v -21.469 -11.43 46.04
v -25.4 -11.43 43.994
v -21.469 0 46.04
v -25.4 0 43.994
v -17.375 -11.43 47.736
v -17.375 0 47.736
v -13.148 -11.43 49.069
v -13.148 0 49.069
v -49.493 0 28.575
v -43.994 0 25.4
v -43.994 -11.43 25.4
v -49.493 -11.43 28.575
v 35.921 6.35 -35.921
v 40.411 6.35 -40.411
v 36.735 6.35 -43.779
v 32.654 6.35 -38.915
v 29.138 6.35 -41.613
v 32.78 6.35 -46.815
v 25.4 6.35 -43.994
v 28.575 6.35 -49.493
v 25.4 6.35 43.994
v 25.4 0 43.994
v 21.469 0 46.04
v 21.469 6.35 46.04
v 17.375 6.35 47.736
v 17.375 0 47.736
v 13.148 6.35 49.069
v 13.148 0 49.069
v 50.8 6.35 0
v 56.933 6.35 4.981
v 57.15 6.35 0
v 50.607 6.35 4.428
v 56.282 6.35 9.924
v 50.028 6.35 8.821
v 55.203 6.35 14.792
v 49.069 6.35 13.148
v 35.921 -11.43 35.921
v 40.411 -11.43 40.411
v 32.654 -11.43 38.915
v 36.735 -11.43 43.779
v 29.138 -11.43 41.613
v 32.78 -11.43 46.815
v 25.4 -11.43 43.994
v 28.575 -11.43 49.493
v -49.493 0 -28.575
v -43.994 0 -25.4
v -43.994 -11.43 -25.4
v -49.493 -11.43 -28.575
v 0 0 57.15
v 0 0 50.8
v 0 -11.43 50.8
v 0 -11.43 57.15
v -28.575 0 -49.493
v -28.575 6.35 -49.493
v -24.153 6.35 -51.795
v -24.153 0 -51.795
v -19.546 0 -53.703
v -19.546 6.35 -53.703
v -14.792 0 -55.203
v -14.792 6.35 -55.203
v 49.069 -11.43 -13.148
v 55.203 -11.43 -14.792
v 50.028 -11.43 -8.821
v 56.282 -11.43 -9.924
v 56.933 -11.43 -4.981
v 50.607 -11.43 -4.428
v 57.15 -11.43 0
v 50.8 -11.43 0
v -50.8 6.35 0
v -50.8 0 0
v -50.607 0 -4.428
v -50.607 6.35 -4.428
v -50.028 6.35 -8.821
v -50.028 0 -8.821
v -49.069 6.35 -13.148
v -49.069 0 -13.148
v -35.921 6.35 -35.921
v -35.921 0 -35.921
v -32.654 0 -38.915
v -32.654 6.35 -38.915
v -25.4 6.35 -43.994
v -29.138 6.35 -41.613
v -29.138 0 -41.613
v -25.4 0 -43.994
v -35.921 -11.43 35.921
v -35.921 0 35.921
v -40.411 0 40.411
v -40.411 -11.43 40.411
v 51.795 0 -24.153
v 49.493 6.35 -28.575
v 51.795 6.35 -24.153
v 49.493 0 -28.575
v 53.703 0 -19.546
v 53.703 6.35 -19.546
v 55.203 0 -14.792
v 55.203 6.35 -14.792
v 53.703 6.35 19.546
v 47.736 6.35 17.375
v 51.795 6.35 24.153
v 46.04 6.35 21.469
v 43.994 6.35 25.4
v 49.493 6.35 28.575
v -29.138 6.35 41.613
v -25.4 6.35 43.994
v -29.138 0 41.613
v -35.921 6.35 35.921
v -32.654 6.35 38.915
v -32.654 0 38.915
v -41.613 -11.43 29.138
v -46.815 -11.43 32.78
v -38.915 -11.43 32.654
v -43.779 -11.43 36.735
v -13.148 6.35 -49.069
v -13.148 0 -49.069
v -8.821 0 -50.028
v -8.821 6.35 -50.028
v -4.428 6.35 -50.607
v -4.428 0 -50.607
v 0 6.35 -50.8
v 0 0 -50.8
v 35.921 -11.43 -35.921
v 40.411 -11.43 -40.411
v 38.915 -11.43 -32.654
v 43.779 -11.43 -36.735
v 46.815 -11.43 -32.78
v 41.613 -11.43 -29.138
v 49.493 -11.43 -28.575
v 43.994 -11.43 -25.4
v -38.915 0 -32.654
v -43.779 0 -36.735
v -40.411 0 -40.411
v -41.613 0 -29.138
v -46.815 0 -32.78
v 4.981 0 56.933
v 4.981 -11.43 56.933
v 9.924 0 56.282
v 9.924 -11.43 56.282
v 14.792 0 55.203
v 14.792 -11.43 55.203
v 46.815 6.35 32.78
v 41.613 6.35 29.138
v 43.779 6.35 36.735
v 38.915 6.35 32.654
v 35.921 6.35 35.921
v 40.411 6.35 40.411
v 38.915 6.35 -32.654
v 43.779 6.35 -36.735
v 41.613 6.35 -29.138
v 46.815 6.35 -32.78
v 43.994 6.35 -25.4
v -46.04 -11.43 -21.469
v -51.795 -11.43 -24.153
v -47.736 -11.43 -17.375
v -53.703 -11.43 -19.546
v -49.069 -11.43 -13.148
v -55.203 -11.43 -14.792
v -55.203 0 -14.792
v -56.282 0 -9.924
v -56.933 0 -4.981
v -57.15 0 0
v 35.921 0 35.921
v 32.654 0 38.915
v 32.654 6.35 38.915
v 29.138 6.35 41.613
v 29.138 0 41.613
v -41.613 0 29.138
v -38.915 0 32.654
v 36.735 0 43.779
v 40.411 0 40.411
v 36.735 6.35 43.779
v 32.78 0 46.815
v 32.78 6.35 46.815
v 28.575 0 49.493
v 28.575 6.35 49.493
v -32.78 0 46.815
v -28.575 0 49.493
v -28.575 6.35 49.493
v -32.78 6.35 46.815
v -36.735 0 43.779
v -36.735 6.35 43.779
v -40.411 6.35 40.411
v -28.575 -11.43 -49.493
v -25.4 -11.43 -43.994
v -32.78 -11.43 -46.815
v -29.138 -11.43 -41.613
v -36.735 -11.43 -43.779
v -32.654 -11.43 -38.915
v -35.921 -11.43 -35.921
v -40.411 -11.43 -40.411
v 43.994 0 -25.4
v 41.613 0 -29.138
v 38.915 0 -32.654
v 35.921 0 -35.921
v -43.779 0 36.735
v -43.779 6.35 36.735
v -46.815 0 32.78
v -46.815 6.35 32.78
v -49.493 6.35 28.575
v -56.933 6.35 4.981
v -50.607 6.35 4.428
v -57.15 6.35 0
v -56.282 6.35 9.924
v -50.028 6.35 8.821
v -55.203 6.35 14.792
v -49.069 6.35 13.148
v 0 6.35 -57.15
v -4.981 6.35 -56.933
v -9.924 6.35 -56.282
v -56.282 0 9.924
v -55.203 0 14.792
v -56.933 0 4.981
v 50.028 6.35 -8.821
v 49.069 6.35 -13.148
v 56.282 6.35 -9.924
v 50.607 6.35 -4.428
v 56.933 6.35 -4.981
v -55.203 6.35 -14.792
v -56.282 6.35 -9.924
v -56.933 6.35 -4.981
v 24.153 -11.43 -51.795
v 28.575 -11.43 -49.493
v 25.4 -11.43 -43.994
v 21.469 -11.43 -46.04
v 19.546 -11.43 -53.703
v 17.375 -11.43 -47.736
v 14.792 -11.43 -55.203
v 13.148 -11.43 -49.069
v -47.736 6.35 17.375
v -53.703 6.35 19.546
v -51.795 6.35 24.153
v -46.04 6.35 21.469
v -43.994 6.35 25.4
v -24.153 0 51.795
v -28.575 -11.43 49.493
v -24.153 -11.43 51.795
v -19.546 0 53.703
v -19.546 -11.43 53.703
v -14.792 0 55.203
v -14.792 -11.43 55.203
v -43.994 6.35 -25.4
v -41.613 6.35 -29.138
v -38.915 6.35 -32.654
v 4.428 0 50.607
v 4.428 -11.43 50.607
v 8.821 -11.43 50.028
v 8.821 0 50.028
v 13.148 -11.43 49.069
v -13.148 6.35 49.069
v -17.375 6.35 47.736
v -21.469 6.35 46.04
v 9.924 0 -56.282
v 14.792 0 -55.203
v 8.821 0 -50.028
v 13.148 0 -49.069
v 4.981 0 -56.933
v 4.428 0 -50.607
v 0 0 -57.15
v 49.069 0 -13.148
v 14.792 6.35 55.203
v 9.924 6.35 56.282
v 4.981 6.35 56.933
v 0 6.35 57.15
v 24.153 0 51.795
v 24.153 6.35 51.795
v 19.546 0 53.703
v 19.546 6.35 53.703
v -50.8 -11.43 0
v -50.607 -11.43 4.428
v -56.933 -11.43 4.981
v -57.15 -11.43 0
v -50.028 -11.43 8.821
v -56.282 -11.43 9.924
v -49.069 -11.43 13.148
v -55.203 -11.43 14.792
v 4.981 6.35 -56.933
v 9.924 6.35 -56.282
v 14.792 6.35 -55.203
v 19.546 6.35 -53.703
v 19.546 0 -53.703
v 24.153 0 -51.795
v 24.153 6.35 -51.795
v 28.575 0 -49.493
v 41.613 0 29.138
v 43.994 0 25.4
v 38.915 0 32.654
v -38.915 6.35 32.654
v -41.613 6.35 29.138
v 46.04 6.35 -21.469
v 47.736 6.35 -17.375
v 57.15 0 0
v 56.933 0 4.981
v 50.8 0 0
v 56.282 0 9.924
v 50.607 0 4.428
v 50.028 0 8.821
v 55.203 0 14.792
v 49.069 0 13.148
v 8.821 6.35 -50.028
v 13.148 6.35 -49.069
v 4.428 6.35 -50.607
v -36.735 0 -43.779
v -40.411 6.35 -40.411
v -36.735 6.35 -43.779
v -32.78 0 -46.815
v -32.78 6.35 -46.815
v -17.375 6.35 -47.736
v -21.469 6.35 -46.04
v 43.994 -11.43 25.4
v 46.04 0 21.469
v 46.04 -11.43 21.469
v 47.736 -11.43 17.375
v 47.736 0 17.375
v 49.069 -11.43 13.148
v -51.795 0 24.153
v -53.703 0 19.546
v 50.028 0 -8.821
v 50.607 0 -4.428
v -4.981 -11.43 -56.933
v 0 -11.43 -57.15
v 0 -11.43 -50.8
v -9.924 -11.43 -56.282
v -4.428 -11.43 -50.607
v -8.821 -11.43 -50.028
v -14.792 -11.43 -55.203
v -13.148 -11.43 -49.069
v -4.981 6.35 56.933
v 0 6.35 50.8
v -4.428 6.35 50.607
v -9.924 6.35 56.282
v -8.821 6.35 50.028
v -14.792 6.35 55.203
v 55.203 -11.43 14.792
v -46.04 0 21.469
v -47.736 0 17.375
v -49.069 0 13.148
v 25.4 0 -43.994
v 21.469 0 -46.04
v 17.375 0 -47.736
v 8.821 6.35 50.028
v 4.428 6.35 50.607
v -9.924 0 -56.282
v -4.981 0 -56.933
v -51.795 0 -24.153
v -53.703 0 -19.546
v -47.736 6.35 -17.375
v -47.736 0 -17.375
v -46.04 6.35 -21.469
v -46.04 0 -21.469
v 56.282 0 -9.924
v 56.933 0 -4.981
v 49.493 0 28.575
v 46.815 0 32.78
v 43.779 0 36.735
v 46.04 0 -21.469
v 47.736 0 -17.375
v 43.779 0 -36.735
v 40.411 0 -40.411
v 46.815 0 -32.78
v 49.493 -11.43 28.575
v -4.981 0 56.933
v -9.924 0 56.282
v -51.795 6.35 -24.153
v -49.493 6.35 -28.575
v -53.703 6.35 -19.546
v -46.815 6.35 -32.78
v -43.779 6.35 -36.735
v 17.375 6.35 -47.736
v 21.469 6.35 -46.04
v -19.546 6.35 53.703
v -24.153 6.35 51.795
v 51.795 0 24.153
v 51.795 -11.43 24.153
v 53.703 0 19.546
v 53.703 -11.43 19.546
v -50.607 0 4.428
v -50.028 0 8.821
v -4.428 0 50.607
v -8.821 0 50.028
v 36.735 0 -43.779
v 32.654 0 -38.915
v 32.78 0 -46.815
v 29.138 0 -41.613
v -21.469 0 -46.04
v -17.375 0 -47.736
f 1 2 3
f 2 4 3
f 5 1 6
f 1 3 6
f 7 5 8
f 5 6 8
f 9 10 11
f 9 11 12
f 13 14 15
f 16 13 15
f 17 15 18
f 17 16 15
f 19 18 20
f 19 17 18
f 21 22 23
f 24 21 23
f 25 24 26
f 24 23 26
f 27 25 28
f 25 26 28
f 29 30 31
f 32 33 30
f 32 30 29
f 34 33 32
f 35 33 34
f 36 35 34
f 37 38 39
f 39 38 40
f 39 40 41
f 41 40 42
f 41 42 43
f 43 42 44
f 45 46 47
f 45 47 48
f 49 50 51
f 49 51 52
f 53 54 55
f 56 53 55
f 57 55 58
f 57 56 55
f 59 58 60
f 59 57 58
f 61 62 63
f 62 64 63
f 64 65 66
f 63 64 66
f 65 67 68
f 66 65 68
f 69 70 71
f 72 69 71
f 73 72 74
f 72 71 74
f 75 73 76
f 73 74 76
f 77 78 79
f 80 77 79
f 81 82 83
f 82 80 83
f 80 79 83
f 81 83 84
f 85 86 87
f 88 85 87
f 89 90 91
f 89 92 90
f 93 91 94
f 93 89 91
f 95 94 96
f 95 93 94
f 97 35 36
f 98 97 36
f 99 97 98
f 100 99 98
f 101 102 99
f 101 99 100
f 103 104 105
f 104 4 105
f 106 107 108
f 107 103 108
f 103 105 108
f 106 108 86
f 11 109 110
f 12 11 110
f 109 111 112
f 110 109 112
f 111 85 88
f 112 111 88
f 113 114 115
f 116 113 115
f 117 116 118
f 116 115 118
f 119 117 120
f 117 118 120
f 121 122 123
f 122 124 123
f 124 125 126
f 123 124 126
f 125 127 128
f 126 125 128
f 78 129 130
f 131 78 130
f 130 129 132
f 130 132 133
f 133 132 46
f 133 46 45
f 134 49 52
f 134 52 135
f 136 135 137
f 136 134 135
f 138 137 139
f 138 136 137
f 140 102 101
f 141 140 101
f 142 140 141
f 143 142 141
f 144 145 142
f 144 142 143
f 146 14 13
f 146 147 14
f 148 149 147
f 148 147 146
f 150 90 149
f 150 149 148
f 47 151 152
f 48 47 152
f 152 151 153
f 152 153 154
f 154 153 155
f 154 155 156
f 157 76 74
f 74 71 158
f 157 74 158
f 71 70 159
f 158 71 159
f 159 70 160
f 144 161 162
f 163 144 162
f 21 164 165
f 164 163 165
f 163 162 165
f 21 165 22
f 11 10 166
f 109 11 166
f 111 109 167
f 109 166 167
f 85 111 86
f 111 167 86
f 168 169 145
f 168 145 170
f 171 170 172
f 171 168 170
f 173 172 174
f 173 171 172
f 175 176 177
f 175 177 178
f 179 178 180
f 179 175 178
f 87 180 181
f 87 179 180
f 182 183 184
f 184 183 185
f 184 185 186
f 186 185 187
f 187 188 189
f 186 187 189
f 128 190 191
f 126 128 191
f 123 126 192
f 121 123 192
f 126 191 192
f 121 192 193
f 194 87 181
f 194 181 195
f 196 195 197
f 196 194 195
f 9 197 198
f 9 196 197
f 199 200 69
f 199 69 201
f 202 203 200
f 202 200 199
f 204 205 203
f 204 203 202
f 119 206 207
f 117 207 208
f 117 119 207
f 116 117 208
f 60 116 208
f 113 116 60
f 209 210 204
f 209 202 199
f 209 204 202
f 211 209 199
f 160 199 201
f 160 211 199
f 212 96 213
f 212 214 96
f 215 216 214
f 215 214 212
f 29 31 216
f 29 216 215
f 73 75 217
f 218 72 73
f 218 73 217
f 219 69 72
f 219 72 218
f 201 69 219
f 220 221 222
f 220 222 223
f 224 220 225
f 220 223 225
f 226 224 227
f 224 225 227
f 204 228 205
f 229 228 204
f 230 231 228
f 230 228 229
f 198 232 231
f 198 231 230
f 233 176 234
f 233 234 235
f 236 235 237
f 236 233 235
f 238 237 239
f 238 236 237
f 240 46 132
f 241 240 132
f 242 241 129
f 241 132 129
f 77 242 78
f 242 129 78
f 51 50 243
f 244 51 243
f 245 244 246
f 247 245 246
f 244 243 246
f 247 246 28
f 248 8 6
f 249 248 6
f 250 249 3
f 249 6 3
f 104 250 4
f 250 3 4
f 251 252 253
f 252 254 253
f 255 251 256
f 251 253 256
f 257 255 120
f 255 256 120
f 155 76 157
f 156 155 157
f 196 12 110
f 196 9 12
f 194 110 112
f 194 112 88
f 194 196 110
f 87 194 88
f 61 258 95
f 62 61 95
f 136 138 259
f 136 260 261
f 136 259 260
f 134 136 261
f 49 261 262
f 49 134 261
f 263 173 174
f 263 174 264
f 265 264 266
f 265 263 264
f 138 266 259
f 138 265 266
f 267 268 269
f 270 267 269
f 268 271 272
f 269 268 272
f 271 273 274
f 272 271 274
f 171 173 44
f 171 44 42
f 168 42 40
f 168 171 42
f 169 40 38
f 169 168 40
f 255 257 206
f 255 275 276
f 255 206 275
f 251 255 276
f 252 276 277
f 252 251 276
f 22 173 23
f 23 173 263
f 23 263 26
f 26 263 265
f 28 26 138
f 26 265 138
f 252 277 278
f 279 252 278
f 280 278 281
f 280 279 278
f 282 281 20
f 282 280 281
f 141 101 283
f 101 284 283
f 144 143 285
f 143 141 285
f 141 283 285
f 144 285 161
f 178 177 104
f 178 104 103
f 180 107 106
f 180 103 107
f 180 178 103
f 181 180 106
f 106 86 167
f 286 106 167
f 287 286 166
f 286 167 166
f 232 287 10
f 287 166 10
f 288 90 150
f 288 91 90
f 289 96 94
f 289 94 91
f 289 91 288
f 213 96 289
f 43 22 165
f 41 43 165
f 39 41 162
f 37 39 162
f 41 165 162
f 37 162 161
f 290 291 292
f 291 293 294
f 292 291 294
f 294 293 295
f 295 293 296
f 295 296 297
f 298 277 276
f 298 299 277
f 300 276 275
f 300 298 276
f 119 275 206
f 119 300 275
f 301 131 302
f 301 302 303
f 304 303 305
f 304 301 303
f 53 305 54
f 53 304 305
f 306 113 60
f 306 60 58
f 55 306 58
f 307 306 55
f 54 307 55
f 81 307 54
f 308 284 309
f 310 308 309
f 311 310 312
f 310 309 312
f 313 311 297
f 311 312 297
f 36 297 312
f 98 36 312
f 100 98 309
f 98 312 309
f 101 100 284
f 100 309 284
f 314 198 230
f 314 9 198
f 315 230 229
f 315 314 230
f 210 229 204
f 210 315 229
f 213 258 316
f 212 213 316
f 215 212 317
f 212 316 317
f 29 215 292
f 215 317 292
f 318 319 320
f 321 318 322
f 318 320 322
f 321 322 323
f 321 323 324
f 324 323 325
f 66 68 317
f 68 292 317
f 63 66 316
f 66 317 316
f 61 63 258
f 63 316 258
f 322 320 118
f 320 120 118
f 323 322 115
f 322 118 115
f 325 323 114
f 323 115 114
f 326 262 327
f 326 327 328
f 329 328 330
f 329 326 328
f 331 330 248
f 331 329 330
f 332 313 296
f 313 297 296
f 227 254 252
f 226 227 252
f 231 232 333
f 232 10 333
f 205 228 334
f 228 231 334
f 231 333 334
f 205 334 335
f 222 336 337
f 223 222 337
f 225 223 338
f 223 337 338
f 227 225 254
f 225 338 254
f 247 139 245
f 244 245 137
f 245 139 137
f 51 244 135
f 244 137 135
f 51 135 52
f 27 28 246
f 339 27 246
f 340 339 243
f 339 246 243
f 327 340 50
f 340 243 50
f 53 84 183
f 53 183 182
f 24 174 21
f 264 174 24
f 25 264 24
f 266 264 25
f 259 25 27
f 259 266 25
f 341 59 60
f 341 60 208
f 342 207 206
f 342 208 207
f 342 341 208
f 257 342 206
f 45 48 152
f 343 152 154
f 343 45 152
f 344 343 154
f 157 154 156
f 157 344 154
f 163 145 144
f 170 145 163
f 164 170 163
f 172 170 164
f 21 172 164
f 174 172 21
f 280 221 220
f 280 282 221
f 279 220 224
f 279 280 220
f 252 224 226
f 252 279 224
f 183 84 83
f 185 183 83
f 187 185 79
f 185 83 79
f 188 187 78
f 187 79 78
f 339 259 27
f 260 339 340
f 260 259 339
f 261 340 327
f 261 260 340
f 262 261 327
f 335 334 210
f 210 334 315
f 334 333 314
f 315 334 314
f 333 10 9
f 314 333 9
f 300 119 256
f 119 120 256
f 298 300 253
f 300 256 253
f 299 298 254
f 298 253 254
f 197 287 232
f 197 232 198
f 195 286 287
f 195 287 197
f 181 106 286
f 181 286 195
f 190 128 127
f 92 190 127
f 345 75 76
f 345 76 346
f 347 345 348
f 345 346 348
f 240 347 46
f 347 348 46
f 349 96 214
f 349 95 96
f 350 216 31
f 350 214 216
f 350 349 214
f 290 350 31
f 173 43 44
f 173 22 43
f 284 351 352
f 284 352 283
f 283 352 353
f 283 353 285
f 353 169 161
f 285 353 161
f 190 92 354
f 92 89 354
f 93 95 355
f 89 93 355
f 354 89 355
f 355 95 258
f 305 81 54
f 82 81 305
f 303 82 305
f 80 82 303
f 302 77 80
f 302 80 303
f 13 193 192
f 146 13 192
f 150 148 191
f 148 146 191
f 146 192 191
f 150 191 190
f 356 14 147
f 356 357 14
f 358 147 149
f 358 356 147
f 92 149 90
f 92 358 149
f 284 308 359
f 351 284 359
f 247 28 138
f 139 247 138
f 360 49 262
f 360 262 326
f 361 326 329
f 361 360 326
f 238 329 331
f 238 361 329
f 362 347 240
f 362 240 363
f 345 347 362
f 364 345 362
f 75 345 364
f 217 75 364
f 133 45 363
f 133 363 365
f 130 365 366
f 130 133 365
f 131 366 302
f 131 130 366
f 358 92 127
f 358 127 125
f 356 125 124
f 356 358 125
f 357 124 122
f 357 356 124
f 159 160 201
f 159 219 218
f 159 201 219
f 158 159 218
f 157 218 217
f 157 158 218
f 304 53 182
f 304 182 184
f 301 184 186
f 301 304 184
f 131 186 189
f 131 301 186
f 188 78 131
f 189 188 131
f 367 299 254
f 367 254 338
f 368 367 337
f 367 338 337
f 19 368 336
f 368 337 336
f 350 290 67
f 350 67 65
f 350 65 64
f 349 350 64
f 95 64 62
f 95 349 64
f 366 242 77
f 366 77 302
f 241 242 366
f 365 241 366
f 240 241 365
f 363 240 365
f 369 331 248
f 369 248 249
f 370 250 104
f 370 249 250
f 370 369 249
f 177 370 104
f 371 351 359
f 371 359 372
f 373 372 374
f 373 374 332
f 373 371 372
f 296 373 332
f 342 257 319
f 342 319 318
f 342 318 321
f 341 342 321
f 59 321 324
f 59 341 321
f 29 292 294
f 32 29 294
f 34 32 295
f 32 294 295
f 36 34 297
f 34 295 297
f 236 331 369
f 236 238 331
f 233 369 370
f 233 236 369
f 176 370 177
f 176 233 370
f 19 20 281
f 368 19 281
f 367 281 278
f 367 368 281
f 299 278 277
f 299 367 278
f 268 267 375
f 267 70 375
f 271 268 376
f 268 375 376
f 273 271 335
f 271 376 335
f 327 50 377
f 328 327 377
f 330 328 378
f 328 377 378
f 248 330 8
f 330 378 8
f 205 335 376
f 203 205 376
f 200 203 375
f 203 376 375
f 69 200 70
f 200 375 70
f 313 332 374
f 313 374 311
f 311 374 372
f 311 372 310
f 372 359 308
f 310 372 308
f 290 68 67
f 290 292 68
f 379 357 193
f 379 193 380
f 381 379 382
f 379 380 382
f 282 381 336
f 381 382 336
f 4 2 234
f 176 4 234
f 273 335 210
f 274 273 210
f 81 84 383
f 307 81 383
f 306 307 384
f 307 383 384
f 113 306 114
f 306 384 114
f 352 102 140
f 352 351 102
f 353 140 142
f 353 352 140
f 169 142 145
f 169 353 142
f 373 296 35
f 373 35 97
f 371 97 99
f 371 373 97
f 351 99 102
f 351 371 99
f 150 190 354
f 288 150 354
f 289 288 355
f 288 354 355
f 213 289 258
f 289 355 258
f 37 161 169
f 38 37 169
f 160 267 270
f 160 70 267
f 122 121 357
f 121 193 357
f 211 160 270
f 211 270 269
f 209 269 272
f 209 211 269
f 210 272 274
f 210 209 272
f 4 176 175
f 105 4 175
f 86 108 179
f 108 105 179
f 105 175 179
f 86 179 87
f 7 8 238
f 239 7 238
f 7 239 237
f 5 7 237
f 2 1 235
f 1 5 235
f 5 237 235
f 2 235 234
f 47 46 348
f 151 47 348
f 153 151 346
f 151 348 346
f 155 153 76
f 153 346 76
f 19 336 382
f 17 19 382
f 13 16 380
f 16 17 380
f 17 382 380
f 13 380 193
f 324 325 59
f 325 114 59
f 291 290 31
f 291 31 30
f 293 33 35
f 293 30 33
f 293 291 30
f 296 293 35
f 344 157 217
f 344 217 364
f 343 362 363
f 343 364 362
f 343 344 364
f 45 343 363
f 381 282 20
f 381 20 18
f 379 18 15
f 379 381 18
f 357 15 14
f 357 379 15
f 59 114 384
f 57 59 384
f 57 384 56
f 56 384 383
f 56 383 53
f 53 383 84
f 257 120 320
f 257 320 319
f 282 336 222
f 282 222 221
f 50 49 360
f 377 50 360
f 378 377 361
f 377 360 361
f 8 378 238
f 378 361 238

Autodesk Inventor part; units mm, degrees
ref_plane "YZ Plane" through (0, 0, 0) normal (1, 0, 0) x (0, 1, 0)
ref_plane "XZ Plane" through (0, 0, 0) normal (0, 1, 0) x (-1, 0, 0)
ref_plane "XY Plane" through (0, 0, 0) normal (0, 0, 1) x (1, 0, 0)
sketch "Sketch1" plane through (0, 0, 0) normal (0, 1, 0) x (-1, 0, 0)
  circle A0 centre (0, 0) radius 57.15
  circle A1 centre (0, 0) radius 50.8
  line L0 (0, 0) -> (0, -57.15)
  line L1 (0, 0) -> (57.15, 0) construction
  line L2 (49.069, -13.148) -> (55.2027, -14.7915)
  line L3 (0, 0) -> (57.15, 0) construction
  line L4 (0, 0) -> (57.15, 0)
  line L5 (43.9941, -25.4) -> (49.4934, -28.575)
  line L6 (0, 0) -> (57.15, 0) construction
  line L7 (50.8, 0) -> (57.15, 0)
  line L8 (49.069, 13.148) -> (55.2027, 14.7915)
  line L9 (43.9941, 25.4) -> (49.4934, 28.575)
  line L10 (35.921, 35.921) -> (40.4112, 40.4112)
  line L11 (25.4, 43.9941) -> (28.575, 49.4934)
  line L12 (13.148, 49.069) -> (14.7915, 55.2027)
  line L13 (0, 50.8) -> (0, 57.15)
  line L14 (-13.148, 49.069) -> (-14.7915, 55.2027)
  line L15 (-25.4, 43.9941) -> (-28.575, 49.4934)
  line L16 (-35.921, 35.921) -> (-40.4112, 40.4112)
  line L17 (-43.9941, 25.4) -> (-49.4934, 28.575)
  line L18 (-49.069, 13.148) -> (-55.2027, 14.7915)
  line L19 (-50.8, 0) -> (-57.15, 0)
  line L20 (-49.069, -13.148) -> (-55.2027, -14.7915)
  line L21 (-43.9941, -25.4) -> (-49.4934, -28.575)
  line L22 (-35.921, -35.921) -> (-40.4112, -40.4112)
  line L23 (-25.4, -43.9941) -> (-28.575, -49.4934)
  line L24 (-13.148, -49.069) -> (-14.7915, -55.2027)
  line L25 (0, -50.8) -> (0, -57.15)
  line L26 (13.148, -49.069) -> (14.7915, -55.2027)
  line L27 (25.4, -43.9941) -> (28.575, -49.4934)
  line L28 (35.921, -35.921) -> (40.4112, -40.4112)
  point P0 (50.8, 0)
  point P1 (0, -50.8)
  dimension "d0" = 114.3
  dimension "d1" = 101.6
  dimension "d3" = 15
  dimension "d4" = 30
  dimension "d7" = 360
extrude "Extrusion1" add sketch "Sketch1" along normal blind 6.35 contours L4 A1 L8 A0 | A0 L2 A1 L4 | L8 A1 L9 A0 | A0 L5 A1 L2 | L9 A1 L10 A0 | A0 L28 A1 L5 | L10 A1 L11 A0 | A0 L27 A1 L28 | L0 A0 L24 A1 | A1 L26 A0 L0 | L11 A1 L12 A0 | A0 L26 A1 L27 | L24 A0 L23 A1 | L12 A1 L13 A0 | L23 A0 L22 A1 | L13 A1 L14 A0 | L22 A0 L21 A1 | L14 A1 L15 A0 | L21 A0 L20 A1 | L15 A1 L16 A0 | L20 A0 L19 A1 | L16 A1 L17 A0 | L19 A0 L18 A1 | L17 A1 L18 A0
extrude "Extrusion2" add sketch "Sketch1" against normal blind 11.43 contours L4 A1 L8 A0 | A0 L5 A1 L2 | L9 A1 L10 A0 | A0 L27 A1 L28 | A1 L26 A0 L0 | L11 A1 L12 A0 | L24 A0 L23 A1 | L13 A1 L14 A0 | L22 A0 L21 A1 | L15 A1 L16 A0 | L20 A0 L19 A1 | L17 A1 L18 A0
properties part number "4 Castle Spacer"
